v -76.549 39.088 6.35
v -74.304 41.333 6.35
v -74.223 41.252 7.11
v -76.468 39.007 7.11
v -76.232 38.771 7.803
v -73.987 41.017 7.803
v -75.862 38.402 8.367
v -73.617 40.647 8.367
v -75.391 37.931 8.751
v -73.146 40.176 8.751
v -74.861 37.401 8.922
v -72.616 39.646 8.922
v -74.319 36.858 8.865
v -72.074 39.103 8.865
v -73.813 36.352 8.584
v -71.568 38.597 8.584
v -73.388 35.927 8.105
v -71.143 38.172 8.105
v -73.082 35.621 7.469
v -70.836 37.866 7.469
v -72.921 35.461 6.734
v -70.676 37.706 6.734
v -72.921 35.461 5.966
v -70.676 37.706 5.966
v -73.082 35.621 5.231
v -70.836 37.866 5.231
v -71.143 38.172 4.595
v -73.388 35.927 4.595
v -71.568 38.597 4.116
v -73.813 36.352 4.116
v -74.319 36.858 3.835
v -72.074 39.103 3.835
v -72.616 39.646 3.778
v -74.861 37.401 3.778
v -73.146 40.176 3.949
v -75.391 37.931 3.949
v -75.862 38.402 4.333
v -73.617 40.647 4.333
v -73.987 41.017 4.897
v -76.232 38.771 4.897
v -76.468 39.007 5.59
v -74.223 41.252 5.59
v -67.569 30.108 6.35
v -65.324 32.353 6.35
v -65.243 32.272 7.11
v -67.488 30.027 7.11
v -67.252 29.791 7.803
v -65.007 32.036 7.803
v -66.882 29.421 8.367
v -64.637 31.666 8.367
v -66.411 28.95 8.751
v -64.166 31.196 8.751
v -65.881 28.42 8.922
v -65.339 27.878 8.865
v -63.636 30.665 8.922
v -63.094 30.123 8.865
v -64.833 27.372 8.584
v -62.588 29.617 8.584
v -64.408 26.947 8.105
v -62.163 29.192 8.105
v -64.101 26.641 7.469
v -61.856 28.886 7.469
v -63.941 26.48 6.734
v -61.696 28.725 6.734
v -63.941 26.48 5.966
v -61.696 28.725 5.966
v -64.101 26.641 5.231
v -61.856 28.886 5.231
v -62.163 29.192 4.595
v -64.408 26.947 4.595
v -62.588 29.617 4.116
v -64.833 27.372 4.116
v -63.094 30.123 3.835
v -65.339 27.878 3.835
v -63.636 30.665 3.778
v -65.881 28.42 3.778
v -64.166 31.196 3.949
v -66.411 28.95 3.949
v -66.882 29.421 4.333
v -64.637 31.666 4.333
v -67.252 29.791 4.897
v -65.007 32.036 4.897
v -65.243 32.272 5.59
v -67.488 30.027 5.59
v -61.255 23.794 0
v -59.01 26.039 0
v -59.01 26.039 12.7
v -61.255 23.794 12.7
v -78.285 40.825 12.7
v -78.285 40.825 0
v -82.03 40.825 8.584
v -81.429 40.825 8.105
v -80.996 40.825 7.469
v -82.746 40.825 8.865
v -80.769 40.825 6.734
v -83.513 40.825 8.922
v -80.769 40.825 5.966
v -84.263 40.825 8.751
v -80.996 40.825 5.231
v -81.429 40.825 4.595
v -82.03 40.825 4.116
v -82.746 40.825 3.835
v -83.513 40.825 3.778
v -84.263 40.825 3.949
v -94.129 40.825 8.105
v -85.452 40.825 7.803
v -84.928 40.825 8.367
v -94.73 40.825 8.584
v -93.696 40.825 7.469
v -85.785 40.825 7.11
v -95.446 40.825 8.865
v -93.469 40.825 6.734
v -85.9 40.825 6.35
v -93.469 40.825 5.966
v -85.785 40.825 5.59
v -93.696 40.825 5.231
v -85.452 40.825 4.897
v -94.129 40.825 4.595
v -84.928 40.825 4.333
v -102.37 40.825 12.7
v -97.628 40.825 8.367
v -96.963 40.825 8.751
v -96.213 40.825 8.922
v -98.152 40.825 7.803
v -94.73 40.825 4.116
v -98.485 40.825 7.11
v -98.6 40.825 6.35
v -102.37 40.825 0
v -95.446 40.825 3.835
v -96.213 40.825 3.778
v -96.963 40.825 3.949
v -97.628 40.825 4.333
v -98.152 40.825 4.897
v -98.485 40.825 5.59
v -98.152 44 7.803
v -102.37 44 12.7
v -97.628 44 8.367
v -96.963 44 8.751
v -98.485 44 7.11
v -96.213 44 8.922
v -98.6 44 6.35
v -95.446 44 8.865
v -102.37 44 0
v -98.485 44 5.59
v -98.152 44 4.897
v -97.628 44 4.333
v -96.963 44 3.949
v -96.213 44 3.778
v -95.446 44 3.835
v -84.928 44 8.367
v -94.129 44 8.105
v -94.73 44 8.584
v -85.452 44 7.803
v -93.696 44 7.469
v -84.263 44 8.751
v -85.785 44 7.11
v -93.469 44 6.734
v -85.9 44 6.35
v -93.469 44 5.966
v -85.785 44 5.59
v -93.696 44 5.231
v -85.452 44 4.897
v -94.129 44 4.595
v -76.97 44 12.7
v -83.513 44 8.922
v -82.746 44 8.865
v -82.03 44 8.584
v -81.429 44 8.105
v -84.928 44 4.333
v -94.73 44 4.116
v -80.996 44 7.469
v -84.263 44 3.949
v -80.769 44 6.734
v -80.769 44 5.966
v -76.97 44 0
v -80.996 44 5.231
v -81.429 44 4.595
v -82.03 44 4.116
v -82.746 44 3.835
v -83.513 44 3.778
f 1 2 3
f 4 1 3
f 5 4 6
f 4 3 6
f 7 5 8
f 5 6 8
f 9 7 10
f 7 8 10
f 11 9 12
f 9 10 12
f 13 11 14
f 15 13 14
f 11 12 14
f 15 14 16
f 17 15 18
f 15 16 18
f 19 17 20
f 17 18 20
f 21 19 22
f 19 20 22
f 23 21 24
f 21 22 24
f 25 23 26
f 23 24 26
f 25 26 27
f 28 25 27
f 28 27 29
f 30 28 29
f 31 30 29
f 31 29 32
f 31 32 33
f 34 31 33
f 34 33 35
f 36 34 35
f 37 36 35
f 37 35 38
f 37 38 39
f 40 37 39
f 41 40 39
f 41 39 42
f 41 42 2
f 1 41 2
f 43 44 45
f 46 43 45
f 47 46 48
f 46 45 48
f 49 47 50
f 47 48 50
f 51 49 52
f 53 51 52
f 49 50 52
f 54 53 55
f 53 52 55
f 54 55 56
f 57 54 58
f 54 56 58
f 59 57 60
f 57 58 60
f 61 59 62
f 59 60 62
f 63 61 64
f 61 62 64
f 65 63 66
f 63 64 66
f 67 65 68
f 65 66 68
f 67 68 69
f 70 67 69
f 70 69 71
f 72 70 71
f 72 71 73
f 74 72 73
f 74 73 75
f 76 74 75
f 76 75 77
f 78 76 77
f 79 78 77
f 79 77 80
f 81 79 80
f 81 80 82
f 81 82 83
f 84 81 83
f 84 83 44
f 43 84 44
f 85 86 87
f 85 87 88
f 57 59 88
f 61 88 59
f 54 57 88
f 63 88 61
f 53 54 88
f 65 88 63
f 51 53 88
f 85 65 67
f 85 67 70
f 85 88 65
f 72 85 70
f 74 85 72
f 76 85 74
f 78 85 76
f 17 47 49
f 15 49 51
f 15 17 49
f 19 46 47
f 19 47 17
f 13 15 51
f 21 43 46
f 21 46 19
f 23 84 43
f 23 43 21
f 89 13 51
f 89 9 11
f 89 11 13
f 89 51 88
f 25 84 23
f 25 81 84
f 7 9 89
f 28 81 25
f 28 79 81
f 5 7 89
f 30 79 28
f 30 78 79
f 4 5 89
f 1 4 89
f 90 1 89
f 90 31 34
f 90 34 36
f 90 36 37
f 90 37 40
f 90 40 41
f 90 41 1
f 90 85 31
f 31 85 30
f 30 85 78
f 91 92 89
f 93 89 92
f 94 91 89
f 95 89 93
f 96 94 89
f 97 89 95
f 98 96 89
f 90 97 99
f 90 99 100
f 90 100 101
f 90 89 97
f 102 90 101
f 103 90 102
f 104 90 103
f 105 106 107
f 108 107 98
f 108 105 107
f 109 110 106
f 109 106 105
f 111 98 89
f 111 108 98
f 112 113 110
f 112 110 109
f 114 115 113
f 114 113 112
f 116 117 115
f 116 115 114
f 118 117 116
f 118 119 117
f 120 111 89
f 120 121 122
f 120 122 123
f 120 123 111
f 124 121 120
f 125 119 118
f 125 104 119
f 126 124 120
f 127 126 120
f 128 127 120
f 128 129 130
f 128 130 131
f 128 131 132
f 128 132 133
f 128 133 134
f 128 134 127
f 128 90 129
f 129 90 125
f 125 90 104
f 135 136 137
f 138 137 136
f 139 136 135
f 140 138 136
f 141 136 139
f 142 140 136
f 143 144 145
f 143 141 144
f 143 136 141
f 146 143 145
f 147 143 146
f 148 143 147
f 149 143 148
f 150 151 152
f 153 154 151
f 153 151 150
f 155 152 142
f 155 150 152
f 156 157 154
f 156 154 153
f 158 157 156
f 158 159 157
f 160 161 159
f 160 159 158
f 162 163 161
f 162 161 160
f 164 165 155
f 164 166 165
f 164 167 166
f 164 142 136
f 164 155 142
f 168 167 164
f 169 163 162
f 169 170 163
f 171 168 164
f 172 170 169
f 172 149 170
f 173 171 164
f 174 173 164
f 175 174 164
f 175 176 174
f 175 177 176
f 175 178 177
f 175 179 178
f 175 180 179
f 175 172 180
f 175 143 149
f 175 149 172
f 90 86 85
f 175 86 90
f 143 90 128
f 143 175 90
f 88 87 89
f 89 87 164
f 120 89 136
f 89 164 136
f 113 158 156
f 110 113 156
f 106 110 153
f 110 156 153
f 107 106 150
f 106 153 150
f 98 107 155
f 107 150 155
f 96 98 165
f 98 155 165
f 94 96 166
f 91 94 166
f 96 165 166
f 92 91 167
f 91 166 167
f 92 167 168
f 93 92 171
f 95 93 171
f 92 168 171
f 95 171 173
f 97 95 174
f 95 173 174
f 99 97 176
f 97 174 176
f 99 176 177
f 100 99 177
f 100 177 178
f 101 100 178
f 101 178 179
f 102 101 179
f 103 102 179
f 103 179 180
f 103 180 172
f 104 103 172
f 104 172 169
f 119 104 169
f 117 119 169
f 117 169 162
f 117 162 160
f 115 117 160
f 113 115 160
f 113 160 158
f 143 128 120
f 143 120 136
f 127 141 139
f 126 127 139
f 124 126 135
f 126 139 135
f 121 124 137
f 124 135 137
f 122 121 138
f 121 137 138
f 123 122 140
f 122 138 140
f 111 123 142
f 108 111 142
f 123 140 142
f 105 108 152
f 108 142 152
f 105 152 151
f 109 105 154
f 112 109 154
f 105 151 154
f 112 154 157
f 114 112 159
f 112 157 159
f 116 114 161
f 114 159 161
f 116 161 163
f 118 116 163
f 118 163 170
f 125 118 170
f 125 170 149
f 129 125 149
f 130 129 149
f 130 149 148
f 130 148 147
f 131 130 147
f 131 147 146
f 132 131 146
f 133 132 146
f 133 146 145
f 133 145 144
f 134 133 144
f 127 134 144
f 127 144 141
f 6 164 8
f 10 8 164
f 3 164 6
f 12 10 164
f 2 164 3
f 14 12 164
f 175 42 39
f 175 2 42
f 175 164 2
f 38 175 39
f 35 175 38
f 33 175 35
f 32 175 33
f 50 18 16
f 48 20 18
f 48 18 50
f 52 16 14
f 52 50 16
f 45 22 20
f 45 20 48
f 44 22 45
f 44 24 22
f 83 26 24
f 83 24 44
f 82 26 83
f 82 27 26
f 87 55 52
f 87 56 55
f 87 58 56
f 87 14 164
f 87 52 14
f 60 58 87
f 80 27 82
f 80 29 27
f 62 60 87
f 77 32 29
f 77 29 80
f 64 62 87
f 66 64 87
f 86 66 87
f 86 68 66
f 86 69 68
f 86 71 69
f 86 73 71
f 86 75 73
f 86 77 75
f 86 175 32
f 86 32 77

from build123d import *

# Parameters (mm, degrees)
BOSS_EXTRUDE1_DEPTH = 12.7
SKETCH2_R           = 2.5796875
CUT_EXTRUDE1_DEPTH  = 12.7
SKETCH3_R           = 2.5796875
CUT_EXTRUDE2_DEPTH  = 12.7


with BuildPart() as part:
    # Sketch1 → Boss-Extrude1 (new body)
    with BuildSketch(Plane.XY):
        Polygon((-102.370082778, 43.999509732), (-76.970082778, 43.999509732), (-59.009570536, 26.03899749), (-61.254634567, 23.79393346), (-78.285210839, 40.824509732), (-102.370082778, 40.824509732), align=None)
    extrude(amount=BOSS_EXTRUDE1_DEPTH)

    # Sketch2 → Cut-Extrude1 (cut)
    with BuildSketch(Plane(origin=(0, 43.999509732, 0), x_dir=(1, 0, 0), z_dir=(0, 1, 0))):
        with Locations(Location((-96.020082778, -6.35, 0), (0, 0, 180))):
            Circle(SKETCH2_R)
        with Locations(Location((-83.320082778, -6.35, 0), (0, 0, 180))):
            Circle(SKETCH2_R)
    extrude(amount=-CUT_EXTRUDE1_DEPTH, mode=Mode.SUBTRACT)

    # Sketch3 → Cut-Extrude2 (cut)
    with BuildSketch(Plane(origin=(-16.485286523, -16.485286523, 0), x_dir=(0, 0, -1), z_dir=(0.707106781186552, 0.707106781186543, 0))):
        with Locations(Location((-6.35, 66.488419182, 0), (0, 0, 90))):
            Circle(SKETCH3_R)
        with Locations(Location((-6.35, 79.188419182, 0), (0, 0, 90))):
            Circle(SKETCH3_R)
    extrude(amount=-CUT_EXTRUDE2_DEPTH, mode=Mode.SUBTRACT)


solid = part.part
